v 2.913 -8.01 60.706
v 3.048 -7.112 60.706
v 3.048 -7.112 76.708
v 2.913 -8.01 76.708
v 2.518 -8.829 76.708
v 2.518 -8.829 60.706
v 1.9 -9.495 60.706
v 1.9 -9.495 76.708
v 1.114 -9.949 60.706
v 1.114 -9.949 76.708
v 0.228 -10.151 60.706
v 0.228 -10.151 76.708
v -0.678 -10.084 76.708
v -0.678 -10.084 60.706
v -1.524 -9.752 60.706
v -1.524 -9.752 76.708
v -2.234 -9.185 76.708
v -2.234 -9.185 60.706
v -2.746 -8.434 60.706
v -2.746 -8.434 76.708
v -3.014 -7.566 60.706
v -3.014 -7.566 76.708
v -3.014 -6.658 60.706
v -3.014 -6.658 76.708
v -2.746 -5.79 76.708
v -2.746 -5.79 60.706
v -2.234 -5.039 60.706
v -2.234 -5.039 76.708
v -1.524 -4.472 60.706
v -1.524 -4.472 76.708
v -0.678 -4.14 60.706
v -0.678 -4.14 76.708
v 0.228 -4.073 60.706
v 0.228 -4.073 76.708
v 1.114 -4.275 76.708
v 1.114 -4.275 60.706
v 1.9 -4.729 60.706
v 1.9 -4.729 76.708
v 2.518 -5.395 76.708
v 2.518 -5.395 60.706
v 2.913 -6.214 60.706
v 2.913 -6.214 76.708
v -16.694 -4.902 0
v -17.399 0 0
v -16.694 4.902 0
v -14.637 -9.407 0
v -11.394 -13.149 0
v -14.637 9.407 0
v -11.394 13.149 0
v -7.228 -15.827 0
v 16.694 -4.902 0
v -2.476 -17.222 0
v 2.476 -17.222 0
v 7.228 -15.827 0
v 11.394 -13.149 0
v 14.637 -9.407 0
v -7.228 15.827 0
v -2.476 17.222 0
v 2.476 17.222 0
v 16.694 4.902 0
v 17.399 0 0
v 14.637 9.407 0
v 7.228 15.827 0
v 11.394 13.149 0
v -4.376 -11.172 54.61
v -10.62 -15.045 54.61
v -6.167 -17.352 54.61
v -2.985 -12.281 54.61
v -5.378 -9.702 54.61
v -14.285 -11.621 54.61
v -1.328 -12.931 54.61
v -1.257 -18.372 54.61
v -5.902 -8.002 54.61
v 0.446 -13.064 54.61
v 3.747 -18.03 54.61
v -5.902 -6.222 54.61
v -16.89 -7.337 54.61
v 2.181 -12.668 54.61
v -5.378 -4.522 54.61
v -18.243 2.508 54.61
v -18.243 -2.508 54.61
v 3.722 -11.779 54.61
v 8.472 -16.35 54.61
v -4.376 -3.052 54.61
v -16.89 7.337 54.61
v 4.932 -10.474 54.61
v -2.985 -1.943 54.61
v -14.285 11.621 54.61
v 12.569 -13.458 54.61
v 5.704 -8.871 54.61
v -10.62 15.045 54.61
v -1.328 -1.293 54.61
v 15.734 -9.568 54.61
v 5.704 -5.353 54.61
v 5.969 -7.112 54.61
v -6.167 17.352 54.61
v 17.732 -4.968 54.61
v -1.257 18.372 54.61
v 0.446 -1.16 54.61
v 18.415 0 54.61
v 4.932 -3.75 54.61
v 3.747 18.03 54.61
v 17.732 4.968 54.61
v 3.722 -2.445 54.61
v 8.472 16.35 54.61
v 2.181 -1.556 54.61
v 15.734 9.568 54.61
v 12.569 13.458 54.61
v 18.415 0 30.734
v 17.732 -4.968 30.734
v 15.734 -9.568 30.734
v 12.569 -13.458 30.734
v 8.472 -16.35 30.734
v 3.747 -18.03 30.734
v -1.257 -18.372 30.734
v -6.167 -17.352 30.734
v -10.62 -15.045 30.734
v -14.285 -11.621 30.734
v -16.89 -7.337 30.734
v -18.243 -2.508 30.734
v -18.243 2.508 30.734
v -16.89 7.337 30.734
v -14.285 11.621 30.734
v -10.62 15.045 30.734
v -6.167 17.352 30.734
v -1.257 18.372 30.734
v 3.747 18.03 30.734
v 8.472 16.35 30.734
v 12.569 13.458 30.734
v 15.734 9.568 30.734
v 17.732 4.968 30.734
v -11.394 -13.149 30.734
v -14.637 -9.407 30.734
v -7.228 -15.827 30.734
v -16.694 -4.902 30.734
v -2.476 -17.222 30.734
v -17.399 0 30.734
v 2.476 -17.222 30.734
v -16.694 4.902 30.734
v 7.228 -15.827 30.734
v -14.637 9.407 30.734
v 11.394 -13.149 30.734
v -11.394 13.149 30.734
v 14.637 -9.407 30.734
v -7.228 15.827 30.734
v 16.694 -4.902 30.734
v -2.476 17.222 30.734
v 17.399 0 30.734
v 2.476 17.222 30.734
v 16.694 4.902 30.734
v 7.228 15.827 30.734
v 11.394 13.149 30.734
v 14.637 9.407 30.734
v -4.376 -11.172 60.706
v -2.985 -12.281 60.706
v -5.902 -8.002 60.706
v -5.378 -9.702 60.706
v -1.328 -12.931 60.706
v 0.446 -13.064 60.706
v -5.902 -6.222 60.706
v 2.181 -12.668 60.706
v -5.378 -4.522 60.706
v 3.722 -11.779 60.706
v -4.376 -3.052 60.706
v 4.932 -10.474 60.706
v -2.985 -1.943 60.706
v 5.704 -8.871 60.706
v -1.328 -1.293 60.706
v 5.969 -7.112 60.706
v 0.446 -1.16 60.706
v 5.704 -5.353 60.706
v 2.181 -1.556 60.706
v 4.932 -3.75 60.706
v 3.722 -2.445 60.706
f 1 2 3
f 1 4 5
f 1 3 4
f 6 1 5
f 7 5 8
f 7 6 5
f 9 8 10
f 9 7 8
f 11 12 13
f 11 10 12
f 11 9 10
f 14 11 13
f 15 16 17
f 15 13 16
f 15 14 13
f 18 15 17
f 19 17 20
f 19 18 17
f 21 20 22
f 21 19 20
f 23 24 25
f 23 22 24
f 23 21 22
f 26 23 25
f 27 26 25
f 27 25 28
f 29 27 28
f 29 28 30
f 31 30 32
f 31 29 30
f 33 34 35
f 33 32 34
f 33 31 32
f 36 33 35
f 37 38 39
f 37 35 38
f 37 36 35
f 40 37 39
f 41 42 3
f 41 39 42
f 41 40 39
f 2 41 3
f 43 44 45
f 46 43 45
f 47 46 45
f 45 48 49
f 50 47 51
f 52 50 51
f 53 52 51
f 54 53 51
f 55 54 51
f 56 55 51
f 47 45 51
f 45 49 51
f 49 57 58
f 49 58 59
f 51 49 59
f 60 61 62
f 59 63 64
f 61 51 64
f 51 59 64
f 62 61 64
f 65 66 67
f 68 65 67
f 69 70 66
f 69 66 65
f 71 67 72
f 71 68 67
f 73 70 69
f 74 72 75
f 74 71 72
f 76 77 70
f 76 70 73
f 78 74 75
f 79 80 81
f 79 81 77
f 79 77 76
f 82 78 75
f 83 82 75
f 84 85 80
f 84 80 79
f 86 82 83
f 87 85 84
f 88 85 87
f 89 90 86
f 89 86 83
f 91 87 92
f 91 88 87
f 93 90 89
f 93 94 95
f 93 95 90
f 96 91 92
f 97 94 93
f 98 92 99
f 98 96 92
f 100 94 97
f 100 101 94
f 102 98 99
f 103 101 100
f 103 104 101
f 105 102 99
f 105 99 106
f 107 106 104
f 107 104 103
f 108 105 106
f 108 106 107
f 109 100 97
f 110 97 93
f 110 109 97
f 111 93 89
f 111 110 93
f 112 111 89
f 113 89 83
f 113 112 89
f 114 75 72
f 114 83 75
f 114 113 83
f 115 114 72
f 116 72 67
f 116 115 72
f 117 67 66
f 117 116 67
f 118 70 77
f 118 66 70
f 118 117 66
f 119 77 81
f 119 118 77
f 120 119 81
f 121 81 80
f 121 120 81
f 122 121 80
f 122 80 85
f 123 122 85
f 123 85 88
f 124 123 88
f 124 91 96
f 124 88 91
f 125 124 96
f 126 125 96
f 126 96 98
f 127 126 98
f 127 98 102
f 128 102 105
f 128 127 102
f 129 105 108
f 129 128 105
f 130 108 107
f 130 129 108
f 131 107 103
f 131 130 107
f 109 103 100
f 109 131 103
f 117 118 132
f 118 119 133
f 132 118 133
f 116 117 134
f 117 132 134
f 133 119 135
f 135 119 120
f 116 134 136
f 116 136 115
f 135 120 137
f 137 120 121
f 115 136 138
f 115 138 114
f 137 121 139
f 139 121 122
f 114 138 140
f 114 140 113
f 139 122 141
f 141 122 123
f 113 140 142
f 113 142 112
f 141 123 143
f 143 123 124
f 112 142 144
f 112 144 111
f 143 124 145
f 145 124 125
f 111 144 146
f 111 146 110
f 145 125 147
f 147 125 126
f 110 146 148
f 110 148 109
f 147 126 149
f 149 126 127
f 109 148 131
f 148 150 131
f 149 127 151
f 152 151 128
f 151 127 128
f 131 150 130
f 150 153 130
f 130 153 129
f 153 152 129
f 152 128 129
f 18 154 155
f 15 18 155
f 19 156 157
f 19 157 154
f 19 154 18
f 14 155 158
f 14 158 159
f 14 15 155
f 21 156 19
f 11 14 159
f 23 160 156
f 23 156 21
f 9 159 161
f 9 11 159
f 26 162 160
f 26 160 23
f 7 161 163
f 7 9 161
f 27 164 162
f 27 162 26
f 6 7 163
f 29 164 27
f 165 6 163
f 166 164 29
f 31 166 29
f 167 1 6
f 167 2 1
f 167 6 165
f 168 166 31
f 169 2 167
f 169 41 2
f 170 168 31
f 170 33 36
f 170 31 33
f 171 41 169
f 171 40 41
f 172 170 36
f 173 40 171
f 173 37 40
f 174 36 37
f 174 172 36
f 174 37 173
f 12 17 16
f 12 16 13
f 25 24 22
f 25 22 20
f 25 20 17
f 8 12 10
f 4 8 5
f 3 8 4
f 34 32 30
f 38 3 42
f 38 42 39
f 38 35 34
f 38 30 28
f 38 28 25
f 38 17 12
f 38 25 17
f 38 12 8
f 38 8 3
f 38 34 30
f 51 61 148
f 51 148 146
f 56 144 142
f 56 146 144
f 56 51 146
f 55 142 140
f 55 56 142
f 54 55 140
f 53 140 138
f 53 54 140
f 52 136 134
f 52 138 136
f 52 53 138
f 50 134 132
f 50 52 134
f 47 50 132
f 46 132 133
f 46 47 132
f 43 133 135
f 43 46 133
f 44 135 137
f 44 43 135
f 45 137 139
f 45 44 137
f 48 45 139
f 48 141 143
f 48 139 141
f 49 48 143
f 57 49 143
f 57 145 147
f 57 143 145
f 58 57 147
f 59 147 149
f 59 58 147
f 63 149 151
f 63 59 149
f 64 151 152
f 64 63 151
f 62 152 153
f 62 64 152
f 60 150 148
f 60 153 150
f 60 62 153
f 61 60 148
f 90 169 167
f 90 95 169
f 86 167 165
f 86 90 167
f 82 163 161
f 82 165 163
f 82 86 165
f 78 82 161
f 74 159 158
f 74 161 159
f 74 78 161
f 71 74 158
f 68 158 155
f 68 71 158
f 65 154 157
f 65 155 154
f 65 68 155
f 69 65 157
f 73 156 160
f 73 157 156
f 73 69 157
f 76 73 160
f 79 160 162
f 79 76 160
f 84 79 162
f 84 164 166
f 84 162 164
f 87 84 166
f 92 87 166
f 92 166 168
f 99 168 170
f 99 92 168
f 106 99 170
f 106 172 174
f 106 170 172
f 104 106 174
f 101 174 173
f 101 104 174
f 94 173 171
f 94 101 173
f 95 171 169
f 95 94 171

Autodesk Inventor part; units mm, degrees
ref_plane "YZ Plane" through (0, 0, 0) normal (1, 0, 0) x (0, 1, 0)
ref_plane "XZ Plane" through (0, 0, 0) normal (0, 1, 0) x (-1, 0, 0)
ref_plane "XY Plane" through (0, 0, 0) normal (0, 0, 1) x (1, 0, 0)
sketch "Sketch1" plane through (0, 0, 0) normal (0, 0, 1) x (1, 0, 0)
  circle A0 centre (0, 0) radius 17.399
  dimension "d0" = 34.798
extrude "Extrusion1" add sketch "Sketch1" along normal blind 30.734
sketch "Sketch2" plane through (0, 0, 30.734) normal (0, 0, 1) x (1, 0, 0)
  circle A0 centre (0, 0) radius 18.415
  dimension "d3" = 36.83
extrude "Extrusion2" add sketch "Sketch2" along normal blind 23.876
sketch "Sketch3" plane through (0, 0, 54.61) normal (0, 0, 1) x (1, 0, 0)
  line L0 (0, 0) -> (0, -7.112) construction
  circle A0 centre (0, -7.112) radius 5.969
  dimension "d6" = 7.112
  dimension "d7" = 11.938
extrude "Extrusion3" add sketch "Sketch3" along normal blind 6.096
sketch "Sketch4" plane through (0, -7.112, 60.706) normal (0, 0, 1) x (1, 0, 0)
  circle A0 centre (0, 0) radius 3.048
  point P0 (0, 7.112)
  dimension "d10" = 6.096
extrude "Extrusion4" add sketch "Sketch4" along normal blind 16.002
properties part number "Drivetrain_Motor"
